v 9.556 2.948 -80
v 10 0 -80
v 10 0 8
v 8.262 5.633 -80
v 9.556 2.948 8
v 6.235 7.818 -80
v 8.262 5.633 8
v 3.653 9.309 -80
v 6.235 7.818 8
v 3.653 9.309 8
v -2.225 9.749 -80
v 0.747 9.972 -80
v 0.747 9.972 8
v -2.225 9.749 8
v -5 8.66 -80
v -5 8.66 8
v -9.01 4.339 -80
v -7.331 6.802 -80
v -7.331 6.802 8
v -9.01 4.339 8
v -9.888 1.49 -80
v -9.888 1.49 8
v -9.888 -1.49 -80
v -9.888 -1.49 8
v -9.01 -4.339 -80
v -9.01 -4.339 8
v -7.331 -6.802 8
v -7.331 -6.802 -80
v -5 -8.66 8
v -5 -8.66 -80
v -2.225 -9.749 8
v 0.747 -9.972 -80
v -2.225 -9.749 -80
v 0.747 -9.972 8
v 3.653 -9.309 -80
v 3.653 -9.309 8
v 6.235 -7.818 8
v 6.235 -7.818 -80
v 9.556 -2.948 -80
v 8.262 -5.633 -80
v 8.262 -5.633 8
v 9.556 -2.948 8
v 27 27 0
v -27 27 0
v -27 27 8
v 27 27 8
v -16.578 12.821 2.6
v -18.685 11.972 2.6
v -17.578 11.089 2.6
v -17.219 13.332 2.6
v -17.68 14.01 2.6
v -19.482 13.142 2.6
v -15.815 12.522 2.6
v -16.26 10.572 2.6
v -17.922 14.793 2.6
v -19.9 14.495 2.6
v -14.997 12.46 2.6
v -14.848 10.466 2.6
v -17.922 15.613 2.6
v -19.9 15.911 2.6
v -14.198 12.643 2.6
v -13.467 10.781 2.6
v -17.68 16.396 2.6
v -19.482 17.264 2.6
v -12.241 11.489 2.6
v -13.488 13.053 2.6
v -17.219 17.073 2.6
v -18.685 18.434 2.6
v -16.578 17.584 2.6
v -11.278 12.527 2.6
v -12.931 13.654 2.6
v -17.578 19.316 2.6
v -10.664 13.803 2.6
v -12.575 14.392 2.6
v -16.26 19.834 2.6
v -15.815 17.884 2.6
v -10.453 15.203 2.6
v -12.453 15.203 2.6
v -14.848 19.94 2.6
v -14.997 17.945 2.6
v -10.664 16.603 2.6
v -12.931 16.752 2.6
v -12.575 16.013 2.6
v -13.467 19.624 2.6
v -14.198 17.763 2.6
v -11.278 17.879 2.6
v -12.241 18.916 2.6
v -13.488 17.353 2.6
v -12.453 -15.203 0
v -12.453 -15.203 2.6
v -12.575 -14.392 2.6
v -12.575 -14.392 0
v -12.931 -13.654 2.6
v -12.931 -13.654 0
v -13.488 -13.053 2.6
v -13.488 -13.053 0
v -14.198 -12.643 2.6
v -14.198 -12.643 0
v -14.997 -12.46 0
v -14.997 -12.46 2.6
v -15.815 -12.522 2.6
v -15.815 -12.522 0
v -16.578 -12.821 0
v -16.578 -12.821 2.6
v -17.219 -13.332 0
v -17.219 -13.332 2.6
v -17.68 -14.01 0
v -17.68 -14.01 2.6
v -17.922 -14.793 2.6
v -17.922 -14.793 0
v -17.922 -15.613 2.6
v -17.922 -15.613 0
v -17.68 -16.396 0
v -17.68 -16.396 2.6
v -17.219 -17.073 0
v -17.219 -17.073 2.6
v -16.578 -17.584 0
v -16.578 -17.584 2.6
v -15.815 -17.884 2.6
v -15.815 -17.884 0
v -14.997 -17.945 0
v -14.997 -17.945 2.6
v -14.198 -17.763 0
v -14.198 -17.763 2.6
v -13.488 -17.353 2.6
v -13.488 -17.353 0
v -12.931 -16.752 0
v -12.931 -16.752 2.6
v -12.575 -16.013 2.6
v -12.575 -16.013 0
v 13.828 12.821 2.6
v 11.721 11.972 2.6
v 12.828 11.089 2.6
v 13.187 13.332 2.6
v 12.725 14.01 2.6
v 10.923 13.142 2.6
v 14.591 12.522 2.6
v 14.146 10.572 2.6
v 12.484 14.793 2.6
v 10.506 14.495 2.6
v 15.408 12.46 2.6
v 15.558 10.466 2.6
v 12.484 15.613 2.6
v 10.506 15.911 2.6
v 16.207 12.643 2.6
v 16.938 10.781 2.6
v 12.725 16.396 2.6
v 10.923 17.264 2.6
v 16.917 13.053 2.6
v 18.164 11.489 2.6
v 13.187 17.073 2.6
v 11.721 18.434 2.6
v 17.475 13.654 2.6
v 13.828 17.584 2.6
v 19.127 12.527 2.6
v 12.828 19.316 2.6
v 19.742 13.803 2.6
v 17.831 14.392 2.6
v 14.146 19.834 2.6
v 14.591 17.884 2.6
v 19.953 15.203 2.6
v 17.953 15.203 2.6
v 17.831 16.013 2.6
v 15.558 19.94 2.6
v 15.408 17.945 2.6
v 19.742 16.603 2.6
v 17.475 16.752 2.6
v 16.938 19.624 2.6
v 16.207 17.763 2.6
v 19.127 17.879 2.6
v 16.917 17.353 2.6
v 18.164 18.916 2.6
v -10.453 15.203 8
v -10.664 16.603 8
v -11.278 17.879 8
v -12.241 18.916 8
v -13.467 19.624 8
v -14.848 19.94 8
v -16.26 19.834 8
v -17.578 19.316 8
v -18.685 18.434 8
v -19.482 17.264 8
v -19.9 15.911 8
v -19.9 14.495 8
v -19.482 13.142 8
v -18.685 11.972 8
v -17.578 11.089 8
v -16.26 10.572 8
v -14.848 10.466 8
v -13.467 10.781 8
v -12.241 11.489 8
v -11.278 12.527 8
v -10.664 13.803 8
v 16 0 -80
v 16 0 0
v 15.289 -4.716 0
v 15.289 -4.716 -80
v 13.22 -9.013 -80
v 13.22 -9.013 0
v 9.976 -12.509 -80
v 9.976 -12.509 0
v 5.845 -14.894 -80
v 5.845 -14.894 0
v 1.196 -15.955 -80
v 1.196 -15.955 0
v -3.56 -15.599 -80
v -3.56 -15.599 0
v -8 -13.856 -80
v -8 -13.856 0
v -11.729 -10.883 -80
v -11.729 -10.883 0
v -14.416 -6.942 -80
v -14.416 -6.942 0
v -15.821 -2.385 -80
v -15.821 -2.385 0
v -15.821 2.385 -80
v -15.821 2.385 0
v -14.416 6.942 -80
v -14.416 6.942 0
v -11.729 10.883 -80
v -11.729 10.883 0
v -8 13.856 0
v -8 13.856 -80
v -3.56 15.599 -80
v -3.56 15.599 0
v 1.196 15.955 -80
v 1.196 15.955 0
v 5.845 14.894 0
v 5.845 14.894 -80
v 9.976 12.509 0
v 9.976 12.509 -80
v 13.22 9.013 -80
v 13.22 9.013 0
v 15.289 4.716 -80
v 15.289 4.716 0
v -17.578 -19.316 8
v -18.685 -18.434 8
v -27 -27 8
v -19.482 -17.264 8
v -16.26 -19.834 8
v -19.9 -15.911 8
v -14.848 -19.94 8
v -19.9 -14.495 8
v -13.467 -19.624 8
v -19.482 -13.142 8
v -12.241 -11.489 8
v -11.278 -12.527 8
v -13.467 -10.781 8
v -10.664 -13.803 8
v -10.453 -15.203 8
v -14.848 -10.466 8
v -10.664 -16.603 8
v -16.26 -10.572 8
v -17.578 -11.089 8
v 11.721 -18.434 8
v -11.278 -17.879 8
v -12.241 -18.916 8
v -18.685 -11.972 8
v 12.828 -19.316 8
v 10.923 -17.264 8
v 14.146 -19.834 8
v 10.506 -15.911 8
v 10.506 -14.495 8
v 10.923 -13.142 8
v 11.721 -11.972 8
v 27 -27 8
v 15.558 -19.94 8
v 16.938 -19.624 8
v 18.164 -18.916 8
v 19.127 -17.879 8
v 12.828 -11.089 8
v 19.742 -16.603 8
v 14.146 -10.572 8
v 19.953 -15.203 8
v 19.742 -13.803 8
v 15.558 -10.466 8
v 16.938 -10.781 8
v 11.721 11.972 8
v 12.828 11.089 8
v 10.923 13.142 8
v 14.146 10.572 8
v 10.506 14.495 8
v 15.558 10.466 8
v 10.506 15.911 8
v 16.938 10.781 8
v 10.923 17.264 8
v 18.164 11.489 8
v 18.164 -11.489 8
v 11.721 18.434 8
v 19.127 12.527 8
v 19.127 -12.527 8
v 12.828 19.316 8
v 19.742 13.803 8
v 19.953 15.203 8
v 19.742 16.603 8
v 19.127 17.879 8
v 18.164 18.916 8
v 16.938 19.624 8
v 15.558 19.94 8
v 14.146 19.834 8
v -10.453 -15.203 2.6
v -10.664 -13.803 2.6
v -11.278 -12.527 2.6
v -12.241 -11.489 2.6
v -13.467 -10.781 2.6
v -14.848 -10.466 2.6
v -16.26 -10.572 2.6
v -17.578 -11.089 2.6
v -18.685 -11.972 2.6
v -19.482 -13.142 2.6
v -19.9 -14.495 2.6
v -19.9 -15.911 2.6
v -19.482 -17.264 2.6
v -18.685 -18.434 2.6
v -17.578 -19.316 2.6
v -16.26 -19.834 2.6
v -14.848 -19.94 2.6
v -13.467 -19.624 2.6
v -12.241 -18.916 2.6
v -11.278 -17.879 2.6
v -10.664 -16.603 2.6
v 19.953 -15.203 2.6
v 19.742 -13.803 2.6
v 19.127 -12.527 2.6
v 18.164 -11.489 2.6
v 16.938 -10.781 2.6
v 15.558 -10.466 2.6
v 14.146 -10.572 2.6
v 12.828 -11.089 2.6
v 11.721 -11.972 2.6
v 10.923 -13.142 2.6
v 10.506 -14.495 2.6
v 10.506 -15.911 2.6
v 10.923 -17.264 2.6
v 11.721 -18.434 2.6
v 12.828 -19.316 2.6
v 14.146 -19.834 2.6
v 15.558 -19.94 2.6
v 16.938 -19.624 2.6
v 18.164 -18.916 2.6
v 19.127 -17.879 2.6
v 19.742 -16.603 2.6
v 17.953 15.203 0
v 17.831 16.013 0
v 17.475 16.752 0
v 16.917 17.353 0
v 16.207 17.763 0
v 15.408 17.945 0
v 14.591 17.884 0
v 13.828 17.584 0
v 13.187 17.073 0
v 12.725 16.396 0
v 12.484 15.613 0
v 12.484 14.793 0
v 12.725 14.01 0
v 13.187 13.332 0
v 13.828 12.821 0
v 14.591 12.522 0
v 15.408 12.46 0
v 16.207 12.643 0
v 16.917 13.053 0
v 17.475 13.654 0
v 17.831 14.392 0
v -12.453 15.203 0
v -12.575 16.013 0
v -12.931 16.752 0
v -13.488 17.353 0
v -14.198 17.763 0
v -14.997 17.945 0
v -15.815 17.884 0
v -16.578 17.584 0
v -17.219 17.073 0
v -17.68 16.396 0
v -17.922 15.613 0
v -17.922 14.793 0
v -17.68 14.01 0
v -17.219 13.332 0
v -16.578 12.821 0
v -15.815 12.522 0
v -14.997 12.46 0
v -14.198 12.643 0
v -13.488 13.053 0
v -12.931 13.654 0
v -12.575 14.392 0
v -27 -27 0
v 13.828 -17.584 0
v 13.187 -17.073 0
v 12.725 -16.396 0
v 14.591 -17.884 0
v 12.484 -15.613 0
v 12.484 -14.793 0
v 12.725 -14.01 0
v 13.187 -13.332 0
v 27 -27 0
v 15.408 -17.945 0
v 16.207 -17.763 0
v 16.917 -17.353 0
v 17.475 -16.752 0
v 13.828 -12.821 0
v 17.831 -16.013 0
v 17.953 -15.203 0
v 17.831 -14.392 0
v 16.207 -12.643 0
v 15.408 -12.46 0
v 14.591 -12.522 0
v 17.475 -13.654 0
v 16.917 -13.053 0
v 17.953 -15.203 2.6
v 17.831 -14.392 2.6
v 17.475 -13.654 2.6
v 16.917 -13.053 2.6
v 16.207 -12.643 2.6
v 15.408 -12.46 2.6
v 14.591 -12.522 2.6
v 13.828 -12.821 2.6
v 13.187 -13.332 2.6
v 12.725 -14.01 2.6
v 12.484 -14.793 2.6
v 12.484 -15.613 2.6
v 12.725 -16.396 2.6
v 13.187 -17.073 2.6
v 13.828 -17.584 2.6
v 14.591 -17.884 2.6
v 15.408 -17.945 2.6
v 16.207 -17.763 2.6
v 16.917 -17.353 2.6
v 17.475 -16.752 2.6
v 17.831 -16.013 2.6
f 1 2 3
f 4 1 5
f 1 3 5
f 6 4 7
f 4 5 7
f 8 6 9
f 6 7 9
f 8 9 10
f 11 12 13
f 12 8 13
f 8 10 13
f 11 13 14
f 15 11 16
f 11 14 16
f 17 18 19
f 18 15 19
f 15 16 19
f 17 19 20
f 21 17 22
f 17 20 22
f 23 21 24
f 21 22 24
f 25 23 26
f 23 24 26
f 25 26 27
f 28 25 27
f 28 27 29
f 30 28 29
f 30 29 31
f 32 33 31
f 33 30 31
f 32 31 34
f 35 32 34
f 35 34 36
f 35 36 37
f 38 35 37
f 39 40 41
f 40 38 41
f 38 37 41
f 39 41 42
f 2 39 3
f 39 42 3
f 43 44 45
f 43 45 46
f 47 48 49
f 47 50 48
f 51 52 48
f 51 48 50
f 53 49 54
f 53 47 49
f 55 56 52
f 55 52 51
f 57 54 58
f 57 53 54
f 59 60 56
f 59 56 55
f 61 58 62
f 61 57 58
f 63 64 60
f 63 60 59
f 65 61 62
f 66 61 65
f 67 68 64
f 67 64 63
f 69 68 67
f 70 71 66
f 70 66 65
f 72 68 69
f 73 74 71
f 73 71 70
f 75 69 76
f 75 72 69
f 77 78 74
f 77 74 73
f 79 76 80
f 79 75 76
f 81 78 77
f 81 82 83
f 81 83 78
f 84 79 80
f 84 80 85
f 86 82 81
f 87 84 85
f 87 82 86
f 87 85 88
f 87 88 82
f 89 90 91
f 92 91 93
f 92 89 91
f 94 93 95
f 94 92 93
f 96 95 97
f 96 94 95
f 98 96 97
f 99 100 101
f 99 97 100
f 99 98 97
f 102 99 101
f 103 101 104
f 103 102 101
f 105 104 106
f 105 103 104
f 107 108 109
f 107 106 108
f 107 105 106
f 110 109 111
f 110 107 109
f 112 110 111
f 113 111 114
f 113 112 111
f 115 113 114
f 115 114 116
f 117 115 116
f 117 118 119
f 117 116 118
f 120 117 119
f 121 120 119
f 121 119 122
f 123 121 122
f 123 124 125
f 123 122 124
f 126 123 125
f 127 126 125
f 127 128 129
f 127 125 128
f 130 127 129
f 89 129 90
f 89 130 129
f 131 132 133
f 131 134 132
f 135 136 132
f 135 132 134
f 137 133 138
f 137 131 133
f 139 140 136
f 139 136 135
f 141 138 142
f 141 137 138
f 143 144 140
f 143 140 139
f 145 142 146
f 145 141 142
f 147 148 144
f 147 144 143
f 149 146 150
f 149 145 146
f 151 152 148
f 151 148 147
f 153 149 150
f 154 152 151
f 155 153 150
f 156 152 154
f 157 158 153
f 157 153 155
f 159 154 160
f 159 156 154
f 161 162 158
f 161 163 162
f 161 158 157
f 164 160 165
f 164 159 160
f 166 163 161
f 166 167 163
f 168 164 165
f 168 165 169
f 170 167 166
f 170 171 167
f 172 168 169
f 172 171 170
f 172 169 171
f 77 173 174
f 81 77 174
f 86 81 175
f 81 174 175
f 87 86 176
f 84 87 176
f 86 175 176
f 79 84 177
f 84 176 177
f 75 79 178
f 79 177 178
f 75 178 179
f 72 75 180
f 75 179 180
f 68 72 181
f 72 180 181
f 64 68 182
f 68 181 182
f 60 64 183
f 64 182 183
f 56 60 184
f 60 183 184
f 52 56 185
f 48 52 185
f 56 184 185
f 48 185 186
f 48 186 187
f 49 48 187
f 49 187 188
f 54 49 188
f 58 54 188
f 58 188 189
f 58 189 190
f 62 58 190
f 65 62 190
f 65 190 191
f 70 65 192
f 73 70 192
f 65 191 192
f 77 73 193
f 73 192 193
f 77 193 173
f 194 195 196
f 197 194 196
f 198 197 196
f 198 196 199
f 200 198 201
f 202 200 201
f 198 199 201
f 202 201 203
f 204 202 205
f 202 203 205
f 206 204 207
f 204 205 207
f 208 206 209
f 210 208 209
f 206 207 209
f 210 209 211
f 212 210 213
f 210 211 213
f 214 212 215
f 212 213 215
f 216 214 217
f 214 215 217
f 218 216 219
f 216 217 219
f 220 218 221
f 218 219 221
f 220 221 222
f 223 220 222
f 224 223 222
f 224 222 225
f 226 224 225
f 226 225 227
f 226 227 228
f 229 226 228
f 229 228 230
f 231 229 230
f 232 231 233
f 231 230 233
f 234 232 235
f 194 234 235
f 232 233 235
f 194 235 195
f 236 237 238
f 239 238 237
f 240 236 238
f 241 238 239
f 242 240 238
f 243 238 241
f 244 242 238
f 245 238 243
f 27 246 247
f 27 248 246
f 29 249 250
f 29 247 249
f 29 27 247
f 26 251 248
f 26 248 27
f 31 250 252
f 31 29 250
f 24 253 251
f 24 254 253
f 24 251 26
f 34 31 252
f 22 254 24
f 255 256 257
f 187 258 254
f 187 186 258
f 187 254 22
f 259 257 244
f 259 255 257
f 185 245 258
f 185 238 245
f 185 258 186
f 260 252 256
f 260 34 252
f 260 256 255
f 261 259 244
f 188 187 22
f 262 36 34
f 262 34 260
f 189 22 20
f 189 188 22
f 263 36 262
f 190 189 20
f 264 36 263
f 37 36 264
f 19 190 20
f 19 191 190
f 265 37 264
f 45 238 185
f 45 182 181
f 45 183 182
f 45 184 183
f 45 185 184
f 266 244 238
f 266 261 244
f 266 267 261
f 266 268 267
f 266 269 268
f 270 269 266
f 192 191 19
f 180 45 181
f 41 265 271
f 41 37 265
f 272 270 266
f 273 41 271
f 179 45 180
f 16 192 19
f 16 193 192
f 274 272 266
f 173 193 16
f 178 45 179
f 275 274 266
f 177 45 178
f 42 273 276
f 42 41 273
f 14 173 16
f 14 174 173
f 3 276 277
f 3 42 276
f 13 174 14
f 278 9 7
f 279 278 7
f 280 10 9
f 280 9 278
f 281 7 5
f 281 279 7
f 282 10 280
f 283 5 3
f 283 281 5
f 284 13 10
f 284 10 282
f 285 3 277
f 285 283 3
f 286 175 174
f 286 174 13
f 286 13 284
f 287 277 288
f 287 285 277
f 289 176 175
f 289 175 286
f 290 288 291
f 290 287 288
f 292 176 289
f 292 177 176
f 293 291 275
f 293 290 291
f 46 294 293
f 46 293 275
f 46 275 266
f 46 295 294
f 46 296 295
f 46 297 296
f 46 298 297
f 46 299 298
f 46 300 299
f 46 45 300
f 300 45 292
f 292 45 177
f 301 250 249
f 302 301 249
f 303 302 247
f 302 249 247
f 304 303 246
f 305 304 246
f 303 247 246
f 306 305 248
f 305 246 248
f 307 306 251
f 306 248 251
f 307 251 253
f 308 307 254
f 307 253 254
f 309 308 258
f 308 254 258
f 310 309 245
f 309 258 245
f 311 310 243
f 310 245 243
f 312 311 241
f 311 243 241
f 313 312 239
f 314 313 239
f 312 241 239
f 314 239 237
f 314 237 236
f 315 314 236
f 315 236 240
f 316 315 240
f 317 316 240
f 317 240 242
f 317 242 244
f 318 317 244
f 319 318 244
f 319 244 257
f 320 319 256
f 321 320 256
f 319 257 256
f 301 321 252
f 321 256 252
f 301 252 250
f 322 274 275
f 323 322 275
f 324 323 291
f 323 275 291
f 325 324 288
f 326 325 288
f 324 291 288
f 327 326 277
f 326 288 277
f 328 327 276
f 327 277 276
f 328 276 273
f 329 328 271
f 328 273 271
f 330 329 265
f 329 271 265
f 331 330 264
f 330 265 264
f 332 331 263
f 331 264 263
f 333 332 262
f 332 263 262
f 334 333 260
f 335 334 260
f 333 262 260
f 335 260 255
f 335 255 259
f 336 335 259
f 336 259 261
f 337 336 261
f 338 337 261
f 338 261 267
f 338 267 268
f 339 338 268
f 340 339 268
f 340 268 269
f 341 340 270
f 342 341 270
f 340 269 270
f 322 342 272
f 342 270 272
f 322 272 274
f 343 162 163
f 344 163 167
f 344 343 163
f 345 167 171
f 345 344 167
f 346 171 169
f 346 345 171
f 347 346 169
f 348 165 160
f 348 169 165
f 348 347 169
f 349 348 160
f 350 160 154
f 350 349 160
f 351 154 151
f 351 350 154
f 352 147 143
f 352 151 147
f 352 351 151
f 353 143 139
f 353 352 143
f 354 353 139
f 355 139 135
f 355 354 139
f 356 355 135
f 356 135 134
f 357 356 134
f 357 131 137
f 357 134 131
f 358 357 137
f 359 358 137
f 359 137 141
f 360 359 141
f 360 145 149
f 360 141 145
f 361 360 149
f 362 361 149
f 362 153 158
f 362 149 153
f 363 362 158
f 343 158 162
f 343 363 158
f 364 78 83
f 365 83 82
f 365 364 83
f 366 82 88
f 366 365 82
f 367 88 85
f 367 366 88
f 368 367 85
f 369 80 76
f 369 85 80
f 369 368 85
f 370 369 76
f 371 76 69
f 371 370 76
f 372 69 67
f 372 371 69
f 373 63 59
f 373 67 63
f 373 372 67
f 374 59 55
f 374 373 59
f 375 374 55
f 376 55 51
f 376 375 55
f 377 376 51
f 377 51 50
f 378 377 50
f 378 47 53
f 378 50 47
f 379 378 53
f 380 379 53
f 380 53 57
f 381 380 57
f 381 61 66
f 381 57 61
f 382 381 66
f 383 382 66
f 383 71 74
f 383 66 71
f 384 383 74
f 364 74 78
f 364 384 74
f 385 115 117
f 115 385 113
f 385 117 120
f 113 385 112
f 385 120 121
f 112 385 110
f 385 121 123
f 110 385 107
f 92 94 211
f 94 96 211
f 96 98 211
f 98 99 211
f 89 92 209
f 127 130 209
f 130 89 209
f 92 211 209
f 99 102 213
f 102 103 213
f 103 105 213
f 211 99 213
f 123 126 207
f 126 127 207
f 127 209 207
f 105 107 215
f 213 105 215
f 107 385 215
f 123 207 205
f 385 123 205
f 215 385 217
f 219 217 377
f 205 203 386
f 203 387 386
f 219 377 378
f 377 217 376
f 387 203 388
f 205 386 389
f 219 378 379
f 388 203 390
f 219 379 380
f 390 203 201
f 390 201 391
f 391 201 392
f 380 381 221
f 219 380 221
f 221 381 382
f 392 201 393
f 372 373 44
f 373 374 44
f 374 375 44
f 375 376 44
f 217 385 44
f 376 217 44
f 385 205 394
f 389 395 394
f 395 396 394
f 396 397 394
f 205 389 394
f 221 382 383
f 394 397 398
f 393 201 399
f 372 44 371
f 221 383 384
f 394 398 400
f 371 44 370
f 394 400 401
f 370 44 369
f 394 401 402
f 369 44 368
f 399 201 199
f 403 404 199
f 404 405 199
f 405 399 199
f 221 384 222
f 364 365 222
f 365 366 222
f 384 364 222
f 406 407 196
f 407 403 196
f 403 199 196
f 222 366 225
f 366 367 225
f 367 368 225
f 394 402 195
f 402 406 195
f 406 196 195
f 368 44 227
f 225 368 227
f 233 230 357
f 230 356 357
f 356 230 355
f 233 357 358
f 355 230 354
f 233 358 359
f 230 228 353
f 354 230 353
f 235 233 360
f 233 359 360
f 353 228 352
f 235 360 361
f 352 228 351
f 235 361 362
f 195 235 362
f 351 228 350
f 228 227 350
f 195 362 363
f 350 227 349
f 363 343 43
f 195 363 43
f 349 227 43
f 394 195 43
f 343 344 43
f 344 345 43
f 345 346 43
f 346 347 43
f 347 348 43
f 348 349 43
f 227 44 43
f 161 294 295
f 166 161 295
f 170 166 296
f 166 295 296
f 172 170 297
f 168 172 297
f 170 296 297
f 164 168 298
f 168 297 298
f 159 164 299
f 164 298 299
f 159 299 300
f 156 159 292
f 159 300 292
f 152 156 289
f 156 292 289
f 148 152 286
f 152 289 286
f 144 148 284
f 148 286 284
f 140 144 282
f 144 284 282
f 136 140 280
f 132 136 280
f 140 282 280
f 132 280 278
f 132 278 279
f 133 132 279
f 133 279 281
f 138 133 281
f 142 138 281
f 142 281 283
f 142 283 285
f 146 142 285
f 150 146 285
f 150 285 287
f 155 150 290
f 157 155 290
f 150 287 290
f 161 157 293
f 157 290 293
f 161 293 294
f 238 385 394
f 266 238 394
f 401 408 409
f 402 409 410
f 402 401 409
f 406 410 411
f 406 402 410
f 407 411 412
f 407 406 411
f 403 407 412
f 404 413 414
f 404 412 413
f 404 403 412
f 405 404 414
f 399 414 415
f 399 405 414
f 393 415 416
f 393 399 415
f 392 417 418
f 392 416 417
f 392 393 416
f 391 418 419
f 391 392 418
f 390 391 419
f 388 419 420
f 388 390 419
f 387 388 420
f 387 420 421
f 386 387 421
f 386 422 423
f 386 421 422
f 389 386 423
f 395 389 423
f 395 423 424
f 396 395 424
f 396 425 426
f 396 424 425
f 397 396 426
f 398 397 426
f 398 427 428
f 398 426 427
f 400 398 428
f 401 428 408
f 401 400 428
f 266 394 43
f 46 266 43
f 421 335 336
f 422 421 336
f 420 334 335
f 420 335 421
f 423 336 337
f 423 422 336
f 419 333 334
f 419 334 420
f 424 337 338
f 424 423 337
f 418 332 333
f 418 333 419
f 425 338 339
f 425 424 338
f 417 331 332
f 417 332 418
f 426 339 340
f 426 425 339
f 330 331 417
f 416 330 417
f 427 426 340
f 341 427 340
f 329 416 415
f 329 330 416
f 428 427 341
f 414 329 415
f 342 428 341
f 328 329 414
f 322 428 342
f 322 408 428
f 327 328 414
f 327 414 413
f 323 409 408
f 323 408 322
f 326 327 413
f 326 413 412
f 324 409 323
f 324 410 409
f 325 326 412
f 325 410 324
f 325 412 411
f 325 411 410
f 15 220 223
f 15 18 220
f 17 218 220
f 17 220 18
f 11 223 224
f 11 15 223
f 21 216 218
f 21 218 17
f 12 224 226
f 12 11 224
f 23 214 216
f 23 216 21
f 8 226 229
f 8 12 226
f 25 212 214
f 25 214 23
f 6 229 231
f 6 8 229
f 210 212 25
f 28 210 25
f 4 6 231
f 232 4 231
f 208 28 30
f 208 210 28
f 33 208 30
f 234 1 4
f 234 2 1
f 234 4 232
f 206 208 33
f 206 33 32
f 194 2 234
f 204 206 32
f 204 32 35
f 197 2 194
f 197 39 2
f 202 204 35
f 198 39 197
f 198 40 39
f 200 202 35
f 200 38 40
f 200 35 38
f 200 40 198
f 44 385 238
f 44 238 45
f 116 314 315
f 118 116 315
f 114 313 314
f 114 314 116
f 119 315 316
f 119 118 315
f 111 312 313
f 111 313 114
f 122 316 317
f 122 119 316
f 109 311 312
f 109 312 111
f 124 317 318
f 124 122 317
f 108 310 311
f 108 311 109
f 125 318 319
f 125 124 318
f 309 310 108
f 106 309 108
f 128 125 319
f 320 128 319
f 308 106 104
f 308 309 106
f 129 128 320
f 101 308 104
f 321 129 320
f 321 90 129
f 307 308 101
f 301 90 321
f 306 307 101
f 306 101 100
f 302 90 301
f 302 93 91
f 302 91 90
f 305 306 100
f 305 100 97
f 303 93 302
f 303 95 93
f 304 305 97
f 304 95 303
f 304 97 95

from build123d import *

# Parameters (mm, degrees)
F0_W     = 54
F0_H     = 54
F0_R     = 2.75
F1_DEPTH = 8
F2_R     = 16
F2_R_2   = 10
F3_DEPTH = 80
F4_R     = 4.75
F5_DEPTH = 5.4
F6_R     = 10
F7_DEPTH = 25


with BuildPart() as f1:
    # F0 (on Top) → F1 (new body)
    with BuildSketch(Plane.XY):
        Rectangle(F0_W, F0_H)
        with Locations((-15.202796, -15.202796)):
            Circle(F0_R, mode=Mode.SUBTRACT)
        with Locations((15.202796, -15.202796)):
            Circle(F0_R, mode=Mode.SUBTRACT)
        with Locations((-15.202796, 15.202796)):
            Circle(F0_R, mode=Mode.SUBTRACT)
        with Locations((15.202796, 15.202796)):
            Circle(F0_R, mode=Mode.SUBTRACT)
    extrude(amount=F1_DEPTH)

    # F2 (on face) → F3 (join)
    with BuildSketch(Plane(origin=(0, 0, 0), x_dir=(1, 0, 0), z_dir=(0, 0, -1))):
        Circle(F2_R)
        Circle(F2_R_2, mode=Mode.SUBTRACT)
    extrude(amount=F3_DEPTH)

    # F4 (on face) → F5 (cut)
    with BuildSketch(Plane.XY.offset(8)):
        with Locations((-15.202796, 15.202796)):
            Circle(F4_R)
        with Locations((15.202796, 15.202796)):
            Circle(F4_R)
        with Locations((15.202796, -15.202796)):
            Circle(F4_R)
        with Locations((-15.202796, -15.202796)):
            Circle(F4_R)
    extrude(amount=-F5_DEPTH, mode=Mode.SUBTRACT)

    # F6 (on face) → F7 (cut)
    with BuildSketch(Plane.XY.offset(8)):
        Circle(F6_R)
    extrude(amount=-F7_DEPTH, mode=Mode.SUBTRACT)


solid = f1.part
